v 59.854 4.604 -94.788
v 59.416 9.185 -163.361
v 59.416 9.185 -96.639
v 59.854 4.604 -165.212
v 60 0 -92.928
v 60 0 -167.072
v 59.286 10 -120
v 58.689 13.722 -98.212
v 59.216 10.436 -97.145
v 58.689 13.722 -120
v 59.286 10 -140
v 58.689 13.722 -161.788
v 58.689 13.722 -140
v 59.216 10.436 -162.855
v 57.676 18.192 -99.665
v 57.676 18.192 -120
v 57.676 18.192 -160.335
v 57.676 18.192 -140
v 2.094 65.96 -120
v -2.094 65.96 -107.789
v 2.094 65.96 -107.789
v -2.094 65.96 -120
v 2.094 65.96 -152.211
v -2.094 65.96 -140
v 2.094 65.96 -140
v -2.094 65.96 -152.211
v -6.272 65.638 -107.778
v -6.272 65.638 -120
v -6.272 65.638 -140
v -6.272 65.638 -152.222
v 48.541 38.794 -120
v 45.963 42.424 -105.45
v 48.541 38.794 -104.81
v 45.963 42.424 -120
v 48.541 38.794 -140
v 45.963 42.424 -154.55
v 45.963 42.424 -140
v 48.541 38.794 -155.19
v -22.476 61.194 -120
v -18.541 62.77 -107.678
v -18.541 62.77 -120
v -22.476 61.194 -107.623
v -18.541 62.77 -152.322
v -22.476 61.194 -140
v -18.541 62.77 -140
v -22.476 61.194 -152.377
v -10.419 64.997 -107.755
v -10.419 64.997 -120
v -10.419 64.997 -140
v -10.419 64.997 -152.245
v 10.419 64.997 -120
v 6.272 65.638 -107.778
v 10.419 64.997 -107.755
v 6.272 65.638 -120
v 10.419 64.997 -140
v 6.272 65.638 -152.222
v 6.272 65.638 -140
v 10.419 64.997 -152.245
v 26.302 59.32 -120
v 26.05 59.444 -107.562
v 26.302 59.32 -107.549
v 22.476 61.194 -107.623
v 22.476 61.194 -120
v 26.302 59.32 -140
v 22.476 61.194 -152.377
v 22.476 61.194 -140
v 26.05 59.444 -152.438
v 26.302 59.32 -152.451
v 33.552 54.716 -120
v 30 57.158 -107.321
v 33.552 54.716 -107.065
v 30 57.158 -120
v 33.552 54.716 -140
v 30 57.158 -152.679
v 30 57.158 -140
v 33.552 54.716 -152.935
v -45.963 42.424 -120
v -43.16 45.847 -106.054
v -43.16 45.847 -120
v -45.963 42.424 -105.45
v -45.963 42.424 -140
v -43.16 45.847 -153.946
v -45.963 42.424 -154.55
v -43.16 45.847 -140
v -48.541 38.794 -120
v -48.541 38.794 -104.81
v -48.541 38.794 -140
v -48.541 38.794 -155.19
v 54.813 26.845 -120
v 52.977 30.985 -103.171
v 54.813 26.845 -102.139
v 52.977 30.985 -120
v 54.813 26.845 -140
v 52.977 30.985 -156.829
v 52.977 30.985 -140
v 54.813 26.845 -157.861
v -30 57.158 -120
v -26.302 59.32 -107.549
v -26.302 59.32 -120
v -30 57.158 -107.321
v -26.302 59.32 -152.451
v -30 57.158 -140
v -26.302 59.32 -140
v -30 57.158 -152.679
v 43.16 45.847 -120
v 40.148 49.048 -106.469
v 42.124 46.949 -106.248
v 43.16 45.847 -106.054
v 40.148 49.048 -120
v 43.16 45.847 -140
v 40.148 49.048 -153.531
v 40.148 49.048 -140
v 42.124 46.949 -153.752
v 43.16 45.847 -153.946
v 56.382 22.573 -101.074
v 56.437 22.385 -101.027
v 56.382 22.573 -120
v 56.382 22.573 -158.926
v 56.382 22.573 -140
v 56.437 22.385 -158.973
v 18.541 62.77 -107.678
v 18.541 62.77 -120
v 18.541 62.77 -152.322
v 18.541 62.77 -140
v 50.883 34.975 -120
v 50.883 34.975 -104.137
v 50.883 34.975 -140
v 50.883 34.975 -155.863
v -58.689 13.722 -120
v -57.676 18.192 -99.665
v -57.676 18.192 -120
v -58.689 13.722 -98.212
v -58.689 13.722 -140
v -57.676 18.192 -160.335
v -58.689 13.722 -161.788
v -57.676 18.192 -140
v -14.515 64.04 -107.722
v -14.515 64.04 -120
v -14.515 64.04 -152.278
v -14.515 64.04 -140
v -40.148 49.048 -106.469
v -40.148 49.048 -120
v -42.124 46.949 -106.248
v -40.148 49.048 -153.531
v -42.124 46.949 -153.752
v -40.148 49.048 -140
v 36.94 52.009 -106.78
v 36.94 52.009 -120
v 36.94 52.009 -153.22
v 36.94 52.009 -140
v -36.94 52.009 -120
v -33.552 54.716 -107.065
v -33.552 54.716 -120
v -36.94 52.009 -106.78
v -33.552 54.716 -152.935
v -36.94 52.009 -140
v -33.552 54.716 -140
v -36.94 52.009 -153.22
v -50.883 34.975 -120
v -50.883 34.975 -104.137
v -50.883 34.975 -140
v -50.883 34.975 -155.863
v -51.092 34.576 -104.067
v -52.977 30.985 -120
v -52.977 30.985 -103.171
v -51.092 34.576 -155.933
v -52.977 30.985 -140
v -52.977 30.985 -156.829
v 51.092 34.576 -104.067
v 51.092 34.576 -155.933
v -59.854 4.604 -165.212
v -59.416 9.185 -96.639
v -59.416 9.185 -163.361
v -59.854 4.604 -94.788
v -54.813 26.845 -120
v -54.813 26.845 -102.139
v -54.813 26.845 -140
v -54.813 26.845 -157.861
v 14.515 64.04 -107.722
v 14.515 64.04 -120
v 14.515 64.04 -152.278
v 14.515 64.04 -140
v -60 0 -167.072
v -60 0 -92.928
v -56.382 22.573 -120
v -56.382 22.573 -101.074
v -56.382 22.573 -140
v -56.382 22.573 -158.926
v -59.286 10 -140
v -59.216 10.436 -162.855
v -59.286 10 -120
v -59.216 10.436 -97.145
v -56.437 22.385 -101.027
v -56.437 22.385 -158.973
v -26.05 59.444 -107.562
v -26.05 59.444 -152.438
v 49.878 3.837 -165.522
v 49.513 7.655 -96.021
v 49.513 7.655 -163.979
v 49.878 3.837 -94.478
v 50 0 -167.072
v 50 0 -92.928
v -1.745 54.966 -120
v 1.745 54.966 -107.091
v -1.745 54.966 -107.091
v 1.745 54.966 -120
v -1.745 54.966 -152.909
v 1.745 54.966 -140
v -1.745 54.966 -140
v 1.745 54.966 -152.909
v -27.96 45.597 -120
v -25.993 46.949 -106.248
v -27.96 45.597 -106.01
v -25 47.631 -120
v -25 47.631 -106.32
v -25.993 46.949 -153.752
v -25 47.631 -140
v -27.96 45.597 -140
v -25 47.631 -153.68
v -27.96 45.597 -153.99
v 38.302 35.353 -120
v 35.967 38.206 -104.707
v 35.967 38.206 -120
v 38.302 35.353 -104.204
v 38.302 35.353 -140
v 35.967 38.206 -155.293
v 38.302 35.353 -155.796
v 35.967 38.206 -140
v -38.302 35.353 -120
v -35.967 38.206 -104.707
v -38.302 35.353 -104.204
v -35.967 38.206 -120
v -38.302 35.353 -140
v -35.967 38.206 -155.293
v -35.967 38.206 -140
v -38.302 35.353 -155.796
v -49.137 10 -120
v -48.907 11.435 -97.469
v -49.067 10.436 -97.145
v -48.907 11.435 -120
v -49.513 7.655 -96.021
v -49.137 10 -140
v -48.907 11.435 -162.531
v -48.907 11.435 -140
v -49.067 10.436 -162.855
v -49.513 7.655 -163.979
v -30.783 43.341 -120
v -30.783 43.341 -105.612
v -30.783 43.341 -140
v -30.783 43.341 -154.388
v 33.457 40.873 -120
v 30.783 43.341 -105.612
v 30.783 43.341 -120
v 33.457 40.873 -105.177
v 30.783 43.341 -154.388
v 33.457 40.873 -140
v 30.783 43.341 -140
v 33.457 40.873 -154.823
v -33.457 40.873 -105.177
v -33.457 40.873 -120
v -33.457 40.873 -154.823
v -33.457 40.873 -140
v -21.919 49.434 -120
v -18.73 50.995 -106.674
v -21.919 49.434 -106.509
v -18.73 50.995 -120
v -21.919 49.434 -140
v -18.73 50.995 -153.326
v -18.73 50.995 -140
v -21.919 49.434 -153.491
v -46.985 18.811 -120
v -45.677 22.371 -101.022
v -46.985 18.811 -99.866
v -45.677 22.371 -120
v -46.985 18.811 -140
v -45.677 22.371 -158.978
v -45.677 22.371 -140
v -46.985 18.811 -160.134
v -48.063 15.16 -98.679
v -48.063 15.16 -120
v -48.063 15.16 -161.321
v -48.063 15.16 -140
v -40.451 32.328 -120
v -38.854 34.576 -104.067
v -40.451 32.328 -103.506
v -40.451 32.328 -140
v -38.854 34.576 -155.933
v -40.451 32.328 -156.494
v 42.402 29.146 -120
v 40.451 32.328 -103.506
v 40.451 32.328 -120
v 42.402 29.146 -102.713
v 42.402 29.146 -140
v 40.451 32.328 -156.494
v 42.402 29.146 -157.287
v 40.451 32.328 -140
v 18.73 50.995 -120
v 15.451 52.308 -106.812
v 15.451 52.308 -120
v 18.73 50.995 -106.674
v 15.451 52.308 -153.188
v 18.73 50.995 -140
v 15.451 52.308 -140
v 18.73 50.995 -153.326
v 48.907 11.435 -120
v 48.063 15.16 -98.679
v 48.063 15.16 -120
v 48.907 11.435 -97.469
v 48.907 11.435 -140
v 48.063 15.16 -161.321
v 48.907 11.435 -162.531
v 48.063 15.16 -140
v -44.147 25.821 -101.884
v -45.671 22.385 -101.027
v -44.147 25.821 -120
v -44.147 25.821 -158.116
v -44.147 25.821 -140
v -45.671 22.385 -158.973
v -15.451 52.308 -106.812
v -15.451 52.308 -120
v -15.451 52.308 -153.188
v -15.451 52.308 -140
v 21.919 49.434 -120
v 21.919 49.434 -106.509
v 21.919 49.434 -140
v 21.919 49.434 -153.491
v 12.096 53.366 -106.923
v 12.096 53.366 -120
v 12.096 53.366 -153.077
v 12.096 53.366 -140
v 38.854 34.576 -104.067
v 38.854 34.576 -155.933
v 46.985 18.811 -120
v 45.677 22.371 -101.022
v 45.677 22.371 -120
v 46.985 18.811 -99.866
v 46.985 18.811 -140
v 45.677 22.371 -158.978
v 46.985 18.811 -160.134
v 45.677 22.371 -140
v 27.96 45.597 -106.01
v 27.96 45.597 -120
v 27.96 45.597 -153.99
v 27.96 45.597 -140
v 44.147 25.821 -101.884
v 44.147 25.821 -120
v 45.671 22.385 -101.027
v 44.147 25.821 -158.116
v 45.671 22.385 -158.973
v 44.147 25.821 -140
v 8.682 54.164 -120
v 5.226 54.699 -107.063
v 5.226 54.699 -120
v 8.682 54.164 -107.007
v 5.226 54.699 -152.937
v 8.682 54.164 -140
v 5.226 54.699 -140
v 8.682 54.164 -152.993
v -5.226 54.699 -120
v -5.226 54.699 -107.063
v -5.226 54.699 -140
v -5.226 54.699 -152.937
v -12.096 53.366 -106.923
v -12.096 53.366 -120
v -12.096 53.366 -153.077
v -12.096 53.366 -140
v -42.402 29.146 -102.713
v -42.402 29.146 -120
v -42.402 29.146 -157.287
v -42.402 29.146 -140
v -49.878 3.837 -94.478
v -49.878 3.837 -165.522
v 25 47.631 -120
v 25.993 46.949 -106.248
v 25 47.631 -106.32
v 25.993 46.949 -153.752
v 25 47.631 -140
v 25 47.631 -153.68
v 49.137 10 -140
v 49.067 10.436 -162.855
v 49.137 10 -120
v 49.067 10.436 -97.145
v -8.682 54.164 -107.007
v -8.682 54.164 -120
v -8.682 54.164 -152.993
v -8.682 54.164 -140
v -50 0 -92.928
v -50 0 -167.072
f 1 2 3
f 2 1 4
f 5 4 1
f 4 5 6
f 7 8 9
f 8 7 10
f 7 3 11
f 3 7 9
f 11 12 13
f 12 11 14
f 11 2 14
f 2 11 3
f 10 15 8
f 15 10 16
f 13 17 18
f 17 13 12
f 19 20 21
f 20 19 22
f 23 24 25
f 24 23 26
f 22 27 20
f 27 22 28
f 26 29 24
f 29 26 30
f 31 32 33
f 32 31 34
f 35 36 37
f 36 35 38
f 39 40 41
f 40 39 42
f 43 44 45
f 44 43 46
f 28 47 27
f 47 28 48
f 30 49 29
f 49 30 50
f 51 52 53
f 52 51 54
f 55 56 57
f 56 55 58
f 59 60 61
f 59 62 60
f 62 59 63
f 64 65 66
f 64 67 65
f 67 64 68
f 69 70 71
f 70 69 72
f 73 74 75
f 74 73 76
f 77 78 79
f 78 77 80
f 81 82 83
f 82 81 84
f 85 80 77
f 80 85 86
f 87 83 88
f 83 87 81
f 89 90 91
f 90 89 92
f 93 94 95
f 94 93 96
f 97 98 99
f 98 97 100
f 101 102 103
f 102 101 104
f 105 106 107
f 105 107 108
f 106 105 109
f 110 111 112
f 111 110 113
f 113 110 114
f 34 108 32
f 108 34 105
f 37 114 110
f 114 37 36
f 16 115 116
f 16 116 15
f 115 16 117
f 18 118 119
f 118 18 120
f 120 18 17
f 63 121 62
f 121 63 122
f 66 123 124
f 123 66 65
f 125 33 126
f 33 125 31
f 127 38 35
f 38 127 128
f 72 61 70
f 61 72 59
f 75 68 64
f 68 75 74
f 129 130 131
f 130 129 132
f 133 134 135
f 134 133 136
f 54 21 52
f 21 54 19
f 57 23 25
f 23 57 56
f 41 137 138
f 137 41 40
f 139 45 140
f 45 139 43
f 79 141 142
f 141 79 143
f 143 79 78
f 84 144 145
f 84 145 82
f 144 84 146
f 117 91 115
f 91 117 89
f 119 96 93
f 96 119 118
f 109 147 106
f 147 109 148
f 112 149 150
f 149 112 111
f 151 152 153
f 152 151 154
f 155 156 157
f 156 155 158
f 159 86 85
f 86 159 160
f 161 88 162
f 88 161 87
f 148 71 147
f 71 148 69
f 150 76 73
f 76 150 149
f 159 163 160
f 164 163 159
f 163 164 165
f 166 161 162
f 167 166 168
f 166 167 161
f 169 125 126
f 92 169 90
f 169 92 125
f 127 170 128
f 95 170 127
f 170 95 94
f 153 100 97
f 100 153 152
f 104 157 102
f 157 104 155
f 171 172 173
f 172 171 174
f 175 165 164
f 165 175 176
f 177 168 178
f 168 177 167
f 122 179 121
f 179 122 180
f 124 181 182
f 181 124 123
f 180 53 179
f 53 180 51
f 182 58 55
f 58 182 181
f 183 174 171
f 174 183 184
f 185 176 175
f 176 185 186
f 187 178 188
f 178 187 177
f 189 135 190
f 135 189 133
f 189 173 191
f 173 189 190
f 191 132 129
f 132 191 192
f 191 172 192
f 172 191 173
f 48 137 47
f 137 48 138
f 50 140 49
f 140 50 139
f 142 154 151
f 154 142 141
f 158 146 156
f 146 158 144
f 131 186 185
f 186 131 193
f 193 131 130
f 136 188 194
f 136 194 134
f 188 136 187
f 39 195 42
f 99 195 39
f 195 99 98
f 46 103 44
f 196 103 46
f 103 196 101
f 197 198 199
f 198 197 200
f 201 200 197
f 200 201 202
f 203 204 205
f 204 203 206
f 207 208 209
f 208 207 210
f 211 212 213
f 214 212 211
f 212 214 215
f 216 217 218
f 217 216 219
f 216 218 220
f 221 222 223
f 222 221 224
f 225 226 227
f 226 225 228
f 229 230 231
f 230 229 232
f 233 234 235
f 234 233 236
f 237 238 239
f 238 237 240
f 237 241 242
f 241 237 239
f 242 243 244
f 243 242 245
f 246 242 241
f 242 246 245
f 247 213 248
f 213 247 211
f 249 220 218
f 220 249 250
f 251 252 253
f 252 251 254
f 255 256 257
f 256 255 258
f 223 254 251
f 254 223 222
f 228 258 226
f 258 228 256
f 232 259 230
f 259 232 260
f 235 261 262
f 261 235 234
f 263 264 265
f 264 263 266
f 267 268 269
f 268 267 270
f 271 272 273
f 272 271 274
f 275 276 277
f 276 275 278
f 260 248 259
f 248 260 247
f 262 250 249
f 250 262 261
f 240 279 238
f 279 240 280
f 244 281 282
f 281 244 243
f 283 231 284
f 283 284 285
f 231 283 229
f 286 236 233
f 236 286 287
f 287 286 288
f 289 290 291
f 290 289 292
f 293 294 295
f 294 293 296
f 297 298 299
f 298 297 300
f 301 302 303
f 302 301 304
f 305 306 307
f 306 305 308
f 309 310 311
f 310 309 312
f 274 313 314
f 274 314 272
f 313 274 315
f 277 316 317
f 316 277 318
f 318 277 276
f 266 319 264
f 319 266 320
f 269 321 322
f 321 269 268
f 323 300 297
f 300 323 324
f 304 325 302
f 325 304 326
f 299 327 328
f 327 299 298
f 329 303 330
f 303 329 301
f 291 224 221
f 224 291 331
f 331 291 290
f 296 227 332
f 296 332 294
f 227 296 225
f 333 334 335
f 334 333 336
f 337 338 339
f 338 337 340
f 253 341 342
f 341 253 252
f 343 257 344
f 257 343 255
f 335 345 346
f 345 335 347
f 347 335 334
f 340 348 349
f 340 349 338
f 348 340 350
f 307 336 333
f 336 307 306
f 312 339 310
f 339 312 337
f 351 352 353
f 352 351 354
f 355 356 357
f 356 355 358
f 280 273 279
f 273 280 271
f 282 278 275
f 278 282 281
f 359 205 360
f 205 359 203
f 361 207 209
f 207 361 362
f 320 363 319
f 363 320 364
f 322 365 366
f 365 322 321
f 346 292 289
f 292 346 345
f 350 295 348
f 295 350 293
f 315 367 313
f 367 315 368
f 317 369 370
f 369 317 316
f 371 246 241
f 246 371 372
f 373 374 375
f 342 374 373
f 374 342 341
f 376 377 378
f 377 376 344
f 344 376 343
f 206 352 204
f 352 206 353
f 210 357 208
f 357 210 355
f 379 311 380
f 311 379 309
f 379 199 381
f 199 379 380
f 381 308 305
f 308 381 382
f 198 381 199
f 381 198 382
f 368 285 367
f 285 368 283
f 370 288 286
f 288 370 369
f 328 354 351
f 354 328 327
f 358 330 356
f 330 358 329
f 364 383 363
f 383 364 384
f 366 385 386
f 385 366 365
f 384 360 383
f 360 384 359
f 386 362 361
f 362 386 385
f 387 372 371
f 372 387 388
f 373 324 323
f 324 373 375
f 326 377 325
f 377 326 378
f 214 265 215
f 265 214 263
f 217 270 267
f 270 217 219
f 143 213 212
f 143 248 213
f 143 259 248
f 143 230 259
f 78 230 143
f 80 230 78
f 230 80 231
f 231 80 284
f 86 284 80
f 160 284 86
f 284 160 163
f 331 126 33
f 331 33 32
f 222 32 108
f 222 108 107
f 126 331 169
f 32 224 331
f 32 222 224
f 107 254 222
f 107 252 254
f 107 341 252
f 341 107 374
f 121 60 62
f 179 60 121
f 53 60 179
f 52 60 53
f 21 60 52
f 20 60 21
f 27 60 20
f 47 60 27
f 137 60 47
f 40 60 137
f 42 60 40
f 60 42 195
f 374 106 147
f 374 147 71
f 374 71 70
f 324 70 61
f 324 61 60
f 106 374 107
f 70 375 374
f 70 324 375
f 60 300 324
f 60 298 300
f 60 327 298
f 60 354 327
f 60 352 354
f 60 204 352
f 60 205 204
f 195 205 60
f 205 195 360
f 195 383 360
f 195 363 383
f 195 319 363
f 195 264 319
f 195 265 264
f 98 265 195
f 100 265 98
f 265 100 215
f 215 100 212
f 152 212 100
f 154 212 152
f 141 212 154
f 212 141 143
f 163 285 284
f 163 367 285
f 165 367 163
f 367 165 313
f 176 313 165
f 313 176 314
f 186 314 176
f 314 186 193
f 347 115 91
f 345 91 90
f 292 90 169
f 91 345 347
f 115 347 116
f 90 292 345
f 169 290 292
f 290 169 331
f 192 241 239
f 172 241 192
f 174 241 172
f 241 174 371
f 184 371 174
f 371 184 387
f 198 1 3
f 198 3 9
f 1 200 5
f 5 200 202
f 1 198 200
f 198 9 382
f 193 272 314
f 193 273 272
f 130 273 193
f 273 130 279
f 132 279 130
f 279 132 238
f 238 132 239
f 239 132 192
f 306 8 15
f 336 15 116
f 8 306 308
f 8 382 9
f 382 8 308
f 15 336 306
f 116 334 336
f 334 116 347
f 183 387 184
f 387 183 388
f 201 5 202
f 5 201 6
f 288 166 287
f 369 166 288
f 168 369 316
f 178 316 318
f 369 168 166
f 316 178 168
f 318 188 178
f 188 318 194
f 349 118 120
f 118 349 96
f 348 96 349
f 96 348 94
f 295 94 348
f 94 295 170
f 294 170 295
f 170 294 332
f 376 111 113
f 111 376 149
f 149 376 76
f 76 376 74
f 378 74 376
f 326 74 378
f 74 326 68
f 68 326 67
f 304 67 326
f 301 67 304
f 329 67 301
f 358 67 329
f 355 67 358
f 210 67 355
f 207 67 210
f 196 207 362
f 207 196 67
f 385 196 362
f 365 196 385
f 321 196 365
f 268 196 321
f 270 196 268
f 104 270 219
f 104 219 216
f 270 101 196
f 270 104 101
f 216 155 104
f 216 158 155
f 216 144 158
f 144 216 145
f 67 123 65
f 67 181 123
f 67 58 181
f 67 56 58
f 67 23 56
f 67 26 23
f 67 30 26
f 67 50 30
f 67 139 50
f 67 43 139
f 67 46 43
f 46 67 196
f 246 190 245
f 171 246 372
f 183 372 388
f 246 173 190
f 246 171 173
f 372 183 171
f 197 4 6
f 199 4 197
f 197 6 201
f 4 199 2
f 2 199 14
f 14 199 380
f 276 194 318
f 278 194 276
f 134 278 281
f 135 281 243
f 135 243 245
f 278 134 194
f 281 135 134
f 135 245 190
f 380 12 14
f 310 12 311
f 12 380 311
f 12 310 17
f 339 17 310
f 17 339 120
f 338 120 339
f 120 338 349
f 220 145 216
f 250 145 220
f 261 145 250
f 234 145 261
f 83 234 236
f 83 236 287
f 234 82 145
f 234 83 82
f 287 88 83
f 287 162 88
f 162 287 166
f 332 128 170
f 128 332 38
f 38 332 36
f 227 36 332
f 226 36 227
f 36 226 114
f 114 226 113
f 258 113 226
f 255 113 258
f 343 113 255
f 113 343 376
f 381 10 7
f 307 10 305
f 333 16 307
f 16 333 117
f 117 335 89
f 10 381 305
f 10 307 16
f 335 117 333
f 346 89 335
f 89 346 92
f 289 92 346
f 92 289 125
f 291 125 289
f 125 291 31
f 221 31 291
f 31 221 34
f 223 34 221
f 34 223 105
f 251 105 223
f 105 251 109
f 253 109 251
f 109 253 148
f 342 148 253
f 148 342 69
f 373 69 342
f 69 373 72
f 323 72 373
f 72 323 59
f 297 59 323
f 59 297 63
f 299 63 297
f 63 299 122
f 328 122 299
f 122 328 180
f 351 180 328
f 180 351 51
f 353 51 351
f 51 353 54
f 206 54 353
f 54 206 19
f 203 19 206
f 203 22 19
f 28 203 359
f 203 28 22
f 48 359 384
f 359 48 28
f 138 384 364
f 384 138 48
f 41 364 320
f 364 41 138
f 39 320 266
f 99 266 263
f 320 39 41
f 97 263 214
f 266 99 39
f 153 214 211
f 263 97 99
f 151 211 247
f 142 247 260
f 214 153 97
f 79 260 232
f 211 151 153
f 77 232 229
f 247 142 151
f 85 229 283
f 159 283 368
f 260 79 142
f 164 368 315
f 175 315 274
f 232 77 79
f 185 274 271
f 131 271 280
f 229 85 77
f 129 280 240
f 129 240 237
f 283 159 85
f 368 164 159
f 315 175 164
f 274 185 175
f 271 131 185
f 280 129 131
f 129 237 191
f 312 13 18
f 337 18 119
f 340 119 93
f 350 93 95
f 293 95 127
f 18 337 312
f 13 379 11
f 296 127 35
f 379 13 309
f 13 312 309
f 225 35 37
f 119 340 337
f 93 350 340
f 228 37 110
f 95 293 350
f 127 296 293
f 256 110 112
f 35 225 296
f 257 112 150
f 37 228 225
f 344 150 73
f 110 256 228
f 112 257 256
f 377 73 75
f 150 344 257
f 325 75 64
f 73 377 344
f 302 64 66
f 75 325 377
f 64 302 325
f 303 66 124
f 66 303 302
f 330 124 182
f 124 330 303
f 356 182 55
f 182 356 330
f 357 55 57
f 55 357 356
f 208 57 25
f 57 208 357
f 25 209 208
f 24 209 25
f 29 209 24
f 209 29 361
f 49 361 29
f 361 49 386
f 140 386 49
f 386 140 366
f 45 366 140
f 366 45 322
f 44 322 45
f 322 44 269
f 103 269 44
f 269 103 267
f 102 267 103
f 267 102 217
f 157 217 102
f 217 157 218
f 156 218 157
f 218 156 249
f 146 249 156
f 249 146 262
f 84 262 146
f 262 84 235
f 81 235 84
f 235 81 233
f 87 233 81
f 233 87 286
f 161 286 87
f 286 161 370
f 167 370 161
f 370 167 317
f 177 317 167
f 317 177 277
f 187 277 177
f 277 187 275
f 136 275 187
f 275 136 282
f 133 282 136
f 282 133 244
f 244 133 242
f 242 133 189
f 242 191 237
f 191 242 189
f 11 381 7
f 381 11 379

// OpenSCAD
//!OpenSCAD

Arch_inner_radius = 50;
Arch_thickness = 5;
Laptop_thickness = 20;


difference() {
  {
    $fn=90;    //set sides to 90
    difference() {
      scale([1, 1.1, 1]){
        difference() {
          cylinder(r1=(Arch_inner_radius + Arch_thickness * 2), r2=(Arch_inner_radius + Arch_thickness * 2), h=1000, center=true);

          cylinder(r1=Arch_inner_radius, r2=Arch_inner_radius, h=10000, center=true);
        }
      }

      translate([0, 0, 500]){
        cube([1000, 1000, 1000], center=true);
      }
      translate([0, ((Arch_inner_radius + Arch_thickness * 2) * 1.2), ((Arch_inner_radius + Arch_thickness * 2) * 1.2)]){
        rotate([0, 90, 0]){
          cylinder(r1=((Arch_inner_radius + Arch_thickness * 2) * 3), r2=((Arch_inner_radius + Arch_thickness * 2) * 3), h=1000, center=true);
        }
      }
      translate([0, -500, 0]){
        cube([1000, 1000, 1000], center=true);
      }
      translate([0, ((Arch_inner_radius + Arch_thickness * 2) * 1.2), ((((Arch_inner_radius + Arch_thickness * 2) * -1.2 - (Arch_inner_radius + Arch_thickness * 2) * 3) - (Arch_inner_radius + Arch_thickness * 2) * 1) - Laptop_thickness)]){
        rotate([0, 90, 0]){
          cylinder(r1=((Arch_inner_radius + Arch_thickness * 2) * 3), r2=((Arch_inner_radius + Arch_thickness * 2) * 3), h=1000, center=true);
        }
      }
      translate([0, 0, -900]){
        cube([1000, 1000, 1000], center=true);
      }
    }
  }

  translate([0, 510, ((((((Arch_inner_radius + Arch_thickness * 2) * -1.2 - (Arch_inner_radius + Arch_thickness * 2) * 3) - (Arch_inner_radius + Arch_thickness * 2) * 1) - Laptop_thickness) + (Arch_inner_radius + Arch_thickness * 2) * 1.2) / 2)]){
    cube([1000, 1000, Laptop_thickness], center=true);
  }
}
